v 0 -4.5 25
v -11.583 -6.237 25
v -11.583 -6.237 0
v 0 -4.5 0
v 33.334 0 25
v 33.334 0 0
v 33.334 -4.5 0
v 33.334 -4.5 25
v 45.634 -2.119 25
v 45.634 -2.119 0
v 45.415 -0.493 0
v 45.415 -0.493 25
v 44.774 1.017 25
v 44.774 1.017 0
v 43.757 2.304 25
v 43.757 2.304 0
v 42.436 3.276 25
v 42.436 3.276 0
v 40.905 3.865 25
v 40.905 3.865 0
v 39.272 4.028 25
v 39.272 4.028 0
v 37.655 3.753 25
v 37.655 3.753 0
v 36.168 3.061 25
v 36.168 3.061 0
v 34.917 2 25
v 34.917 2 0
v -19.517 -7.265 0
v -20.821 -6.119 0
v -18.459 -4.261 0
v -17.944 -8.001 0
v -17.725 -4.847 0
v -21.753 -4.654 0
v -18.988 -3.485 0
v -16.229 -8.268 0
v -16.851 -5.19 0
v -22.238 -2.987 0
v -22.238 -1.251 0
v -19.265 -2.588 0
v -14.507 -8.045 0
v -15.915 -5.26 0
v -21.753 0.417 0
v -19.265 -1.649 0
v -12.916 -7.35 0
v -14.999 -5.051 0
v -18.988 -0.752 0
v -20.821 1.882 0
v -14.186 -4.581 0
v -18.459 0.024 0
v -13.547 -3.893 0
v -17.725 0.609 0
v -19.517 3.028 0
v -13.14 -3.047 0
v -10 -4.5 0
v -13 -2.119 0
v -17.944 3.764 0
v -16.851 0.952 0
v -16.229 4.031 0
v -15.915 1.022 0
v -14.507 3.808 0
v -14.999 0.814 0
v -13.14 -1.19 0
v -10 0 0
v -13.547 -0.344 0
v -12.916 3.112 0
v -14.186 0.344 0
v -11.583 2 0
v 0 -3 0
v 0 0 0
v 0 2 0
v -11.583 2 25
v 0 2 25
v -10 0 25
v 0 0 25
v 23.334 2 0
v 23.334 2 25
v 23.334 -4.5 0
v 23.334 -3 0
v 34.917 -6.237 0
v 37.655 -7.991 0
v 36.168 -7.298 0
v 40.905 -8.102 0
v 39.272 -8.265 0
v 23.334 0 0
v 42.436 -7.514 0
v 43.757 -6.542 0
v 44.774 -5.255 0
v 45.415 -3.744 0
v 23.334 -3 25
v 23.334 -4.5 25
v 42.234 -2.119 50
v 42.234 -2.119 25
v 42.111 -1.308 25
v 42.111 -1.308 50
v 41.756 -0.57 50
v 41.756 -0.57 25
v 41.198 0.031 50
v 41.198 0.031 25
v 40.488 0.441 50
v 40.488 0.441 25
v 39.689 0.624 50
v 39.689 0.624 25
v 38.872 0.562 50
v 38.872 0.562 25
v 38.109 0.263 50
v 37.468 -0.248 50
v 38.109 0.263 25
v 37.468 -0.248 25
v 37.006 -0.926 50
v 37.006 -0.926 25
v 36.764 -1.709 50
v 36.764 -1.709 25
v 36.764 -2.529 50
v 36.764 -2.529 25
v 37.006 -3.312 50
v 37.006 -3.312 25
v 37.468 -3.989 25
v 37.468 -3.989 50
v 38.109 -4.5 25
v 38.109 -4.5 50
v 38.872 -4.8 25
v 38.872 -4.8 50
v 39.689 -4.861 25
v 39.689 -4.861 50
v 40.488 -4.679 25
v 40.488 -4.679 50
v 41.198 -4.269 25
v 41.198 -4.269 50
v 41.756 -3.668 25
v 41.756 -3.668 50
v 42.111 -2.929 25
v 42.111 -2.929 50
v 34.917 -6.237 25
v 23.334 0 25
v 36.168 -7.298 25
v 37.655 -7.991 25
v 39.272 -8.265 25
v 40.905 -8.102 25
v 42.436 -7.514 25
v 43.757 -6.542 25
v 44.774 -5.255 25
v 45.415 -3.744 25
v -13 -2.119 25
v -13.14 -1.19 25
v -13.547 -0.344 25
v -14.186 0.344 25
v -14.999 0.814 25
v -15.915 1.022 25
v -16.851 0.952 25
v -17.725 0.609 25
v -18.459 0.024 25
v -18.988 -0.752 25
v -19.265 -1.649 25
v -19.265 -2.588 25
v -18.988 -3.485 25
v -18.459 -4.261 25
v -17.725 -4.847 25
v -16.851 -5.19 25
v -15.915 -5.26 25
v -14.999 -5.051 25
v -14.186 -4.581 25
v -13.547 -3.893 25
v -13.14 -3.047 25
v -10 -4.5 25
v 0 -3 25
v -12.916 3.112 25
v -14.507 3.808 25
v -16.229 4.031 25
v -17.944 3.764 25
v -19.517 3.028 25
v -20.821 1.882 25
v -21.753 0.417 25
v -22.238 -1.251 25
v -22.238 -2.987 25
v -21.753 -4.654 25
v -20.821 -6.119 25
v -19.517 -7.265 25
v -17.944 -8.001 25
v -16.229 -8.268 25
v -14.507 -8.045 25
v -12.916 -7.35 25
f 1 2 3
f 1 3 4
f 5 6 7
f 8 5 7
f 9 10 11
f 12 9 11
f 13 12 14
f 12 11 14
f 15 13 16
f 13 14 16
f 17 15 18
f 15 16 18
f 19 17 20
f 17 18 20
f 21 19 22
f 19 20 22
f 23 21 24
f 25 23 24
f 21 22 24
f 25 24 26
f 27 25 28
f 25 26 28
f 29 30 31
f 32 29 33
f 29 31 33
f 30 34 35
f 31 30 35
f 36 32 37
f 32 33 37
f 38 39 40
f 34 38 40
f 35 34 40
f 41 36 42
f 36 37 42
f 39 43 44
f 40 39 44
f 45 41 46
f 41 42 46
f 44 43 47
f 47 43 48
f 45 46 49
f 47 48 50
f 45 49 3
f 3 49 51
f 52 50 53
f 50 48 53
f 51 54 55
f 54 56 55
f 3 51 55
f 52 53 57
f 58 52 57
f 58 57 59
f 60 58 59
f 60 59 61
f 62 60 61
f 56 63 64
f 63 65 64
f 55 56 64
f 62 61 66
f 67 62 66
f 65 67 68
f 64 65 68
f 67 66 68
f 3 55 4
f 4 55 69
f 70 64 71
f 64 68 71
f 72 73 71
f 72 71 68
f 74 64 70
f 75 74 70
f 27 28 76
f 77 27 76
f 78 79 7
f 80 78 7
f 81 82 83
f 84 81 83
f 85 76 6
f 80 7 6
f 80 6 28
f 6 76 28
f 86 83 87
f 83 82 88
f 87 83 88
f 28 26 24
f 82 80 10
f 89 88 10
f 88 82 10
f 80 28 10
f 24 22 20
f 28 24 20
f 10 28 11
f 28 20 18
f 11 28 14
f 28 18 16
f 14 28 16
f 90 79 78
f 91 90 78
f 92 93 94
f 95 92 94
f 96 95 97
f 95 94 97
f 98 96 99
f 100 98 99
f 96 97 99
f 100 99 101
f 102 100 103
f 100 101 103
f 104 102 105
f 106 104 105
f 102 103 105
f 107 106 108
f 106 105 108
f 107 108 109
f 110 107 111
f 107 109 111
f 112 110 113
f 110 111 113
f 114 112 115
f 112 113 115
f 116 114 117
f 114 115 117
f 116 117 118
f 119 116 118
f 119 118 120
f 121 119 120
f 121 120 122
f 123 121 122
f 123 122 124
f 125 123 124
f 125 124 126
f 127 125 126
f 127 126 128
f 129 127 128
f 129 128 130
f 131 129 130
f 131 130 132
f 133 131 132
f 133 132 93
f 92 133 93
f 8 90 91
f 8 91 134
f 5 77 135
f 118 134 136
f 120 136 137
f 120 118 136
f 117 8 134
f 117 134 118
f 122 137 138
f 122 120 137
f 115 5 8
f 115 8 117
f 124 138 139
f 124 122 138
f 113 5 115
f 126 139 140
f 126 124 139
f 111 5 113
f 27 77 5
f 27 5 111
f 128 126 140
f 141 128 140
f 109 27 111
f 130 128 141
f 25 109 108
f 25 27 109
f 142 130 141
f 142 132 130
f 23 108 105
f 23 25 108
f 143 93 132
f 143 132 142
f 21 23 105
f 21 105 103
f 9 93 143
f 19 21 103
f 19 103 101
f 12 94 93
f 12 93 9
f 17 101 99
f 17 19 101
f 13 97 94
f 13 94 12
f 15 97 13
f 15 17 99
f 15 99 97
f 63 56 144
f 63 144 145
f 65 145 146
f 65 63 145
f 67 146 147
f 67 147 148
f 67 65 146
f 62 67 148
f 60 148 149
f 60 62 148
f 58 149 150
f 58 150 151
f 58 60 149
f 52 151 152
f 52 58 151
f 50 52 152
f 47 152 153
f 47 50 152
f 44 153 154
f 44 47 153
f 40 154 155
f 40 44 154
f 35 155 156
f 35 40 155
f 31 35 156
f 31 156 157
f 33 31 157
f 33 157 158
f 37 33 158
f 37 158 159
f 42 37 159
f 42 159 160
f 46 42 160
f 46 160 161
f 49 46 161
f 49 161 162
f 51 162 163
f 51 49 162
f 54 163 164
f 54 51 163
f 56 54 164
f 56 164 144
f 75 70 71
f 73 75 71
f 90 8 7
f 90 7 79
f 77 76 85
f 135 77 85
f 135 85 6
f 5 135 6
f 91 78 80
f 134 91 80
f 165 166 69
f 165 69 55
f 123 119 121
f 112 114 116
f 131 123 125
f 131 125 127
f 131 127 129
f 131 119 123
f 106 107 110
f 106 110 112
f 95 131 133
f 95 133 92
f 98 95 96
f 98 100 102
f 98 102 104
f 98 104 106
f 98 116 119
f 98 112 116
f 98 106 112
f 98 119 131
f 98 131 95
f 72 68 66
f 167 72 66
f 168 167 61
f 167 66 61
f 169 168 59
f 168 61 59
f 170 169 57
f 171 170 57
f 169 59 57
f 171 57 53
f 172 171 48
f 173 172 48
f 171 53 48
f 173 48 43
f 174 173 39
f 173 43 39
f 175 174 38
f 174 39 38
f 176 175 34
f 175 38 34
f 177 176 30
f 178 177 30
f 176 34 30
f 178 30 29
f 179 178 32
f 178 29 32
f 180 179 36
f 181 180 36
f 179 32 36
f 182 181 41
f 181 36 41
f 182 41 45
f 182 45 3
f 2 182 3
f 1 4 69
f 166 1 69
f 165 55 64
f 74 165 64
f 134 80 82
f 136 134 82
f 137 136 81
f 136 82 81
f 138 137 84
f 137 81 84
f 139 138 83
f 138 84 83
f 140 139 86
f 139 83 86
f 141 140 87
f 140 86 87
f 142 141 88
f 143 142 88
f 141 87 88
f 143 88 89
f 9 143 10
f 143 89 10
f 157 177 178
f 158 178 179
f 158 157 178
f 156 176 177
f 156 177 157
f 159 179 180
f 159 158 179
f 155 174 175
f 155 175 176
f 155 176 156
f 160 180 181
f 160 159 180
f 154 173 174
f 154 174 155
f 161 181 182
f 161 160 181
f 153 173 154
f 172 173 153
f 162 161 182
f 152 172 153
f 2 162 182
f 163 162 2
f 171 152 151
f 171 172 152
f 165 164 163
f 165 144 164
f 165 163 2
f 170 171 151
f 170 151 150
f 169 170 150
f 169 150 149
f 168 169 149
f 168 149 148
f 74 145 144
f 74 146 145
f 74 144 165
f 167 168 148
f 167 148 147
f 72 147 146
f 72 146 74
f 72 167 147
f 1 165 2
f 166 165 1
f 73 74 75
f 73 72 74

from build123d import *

# Parameters (mm, degrees)
F0_R     = 3.15
F1_DEPTH = 25
F0_R_2   = 2.75
F2_DEPTH = 25
F3_DEPTH = 50


with BuildPart() as f1:
    # F0 (on Top) → F1 (new body)
    with BuildSketch(Plane.XY):
        with BuildLine():
            Line((-10, 0), (0, 0))
            Line((0, 0), (0, 2))
            Line((0, 2), (-11.582869, 2))
            ThreePointArc((-11.582869, 2), (-10.40934, 0.087486), (-10, -2.118715))
            Line((-10, -2.118715), (-10, 0))
        make_face()
        with BuildLine():
            ThreePointArc((-11.582869, -6.23743), (-10.40934, -4.324916), (-10, -2.118715))
            ThreePointArc((-10, -2.118715), (-10.40934, 0.087486), (-11.582869, 2))
            ThreePointArc((-11.582869, 2), (-22.3, -2.118715), (-11.582869, -6.23743))
        make_face()
        with Locations((-16.15, -2.118715)):
            Circle(F0_R, mode=Mode.SUBTRACT)
        with BuildLine():
            Line((-10, -4.5), (-10, -2.118715))
            ThreePointArc((-10, -2.118715), (-10.40934, -4.324916), (-11.582869, -6.23743))
            Line((-11.582869, -6.23743), (0, -4.5))
            Line((0, -4.5), (0, -3))
            Line((0, -3), (-10, -4.5))
        make_face()
    extrude(amount=F1_DEPTH)


with BuildPart() as f2:
    # F0 (on Top) → F2 (new body)
    with BuildSketch(Plane.XY):
        with BuildLine():
            ThreePointArc((45.633649, -2.118715), (41.68985, 3.621945), (34.916518, 2))
            ThreePointArc((34.916518, 2), (33.742989, 0.087486), (33.333649, -2.118715))
            ThreePointArc((33.333649, -2.118715), (33.742989, -4.324916), (34.916518, -6.23743))
            ThreePointArc((34.916518, -6.23743), (41.68985, -7.859375), (45.633649, -2.118715))
        make_face()
        with Locations((39.483649, -2.118715)):
            Circle(F0_R_2, mode=Mode.SUBTRACT)
        with BuildLine():
            Line((23.333649, 2), (23.333649, 0))
            Line((23.333649, 0), (33.333649, 0))
            Line((33.333649, 0), (33.333649, -2.118715))
            ThreePointArc((33.333649, -2.118715), (33.742989, 0.087486), (34.916518, 2))
            Line((34.916518, 2), (23.333649, 2))
        make_face()
        with BuildLine():
            ThreePointArc((34.916518, -6.23743), (33.742989, -4.324916), (33.333649, -2.118715))
            Line((33.333649, -2.118715), (33.333649, -4.5))
            Line((33.333649, -4.5), (23.333649, -3))
            Line((23.333649, -3), (23.333649, -4.5))
            Line((23.333649, -4.5), (34.916518, -6.23743))
        make_face()
    extrude(amount=F2_DEPTH)

    # F0 (on Top) → F3 (join)
    with BuildSketch(Plane.XY):
        with Locations((39.483649, -2.118715)):
            Circle(F0_R_2)
    extrude(amount=F3_DEPTH)


solid = Compound([f1.part, f2.part])
